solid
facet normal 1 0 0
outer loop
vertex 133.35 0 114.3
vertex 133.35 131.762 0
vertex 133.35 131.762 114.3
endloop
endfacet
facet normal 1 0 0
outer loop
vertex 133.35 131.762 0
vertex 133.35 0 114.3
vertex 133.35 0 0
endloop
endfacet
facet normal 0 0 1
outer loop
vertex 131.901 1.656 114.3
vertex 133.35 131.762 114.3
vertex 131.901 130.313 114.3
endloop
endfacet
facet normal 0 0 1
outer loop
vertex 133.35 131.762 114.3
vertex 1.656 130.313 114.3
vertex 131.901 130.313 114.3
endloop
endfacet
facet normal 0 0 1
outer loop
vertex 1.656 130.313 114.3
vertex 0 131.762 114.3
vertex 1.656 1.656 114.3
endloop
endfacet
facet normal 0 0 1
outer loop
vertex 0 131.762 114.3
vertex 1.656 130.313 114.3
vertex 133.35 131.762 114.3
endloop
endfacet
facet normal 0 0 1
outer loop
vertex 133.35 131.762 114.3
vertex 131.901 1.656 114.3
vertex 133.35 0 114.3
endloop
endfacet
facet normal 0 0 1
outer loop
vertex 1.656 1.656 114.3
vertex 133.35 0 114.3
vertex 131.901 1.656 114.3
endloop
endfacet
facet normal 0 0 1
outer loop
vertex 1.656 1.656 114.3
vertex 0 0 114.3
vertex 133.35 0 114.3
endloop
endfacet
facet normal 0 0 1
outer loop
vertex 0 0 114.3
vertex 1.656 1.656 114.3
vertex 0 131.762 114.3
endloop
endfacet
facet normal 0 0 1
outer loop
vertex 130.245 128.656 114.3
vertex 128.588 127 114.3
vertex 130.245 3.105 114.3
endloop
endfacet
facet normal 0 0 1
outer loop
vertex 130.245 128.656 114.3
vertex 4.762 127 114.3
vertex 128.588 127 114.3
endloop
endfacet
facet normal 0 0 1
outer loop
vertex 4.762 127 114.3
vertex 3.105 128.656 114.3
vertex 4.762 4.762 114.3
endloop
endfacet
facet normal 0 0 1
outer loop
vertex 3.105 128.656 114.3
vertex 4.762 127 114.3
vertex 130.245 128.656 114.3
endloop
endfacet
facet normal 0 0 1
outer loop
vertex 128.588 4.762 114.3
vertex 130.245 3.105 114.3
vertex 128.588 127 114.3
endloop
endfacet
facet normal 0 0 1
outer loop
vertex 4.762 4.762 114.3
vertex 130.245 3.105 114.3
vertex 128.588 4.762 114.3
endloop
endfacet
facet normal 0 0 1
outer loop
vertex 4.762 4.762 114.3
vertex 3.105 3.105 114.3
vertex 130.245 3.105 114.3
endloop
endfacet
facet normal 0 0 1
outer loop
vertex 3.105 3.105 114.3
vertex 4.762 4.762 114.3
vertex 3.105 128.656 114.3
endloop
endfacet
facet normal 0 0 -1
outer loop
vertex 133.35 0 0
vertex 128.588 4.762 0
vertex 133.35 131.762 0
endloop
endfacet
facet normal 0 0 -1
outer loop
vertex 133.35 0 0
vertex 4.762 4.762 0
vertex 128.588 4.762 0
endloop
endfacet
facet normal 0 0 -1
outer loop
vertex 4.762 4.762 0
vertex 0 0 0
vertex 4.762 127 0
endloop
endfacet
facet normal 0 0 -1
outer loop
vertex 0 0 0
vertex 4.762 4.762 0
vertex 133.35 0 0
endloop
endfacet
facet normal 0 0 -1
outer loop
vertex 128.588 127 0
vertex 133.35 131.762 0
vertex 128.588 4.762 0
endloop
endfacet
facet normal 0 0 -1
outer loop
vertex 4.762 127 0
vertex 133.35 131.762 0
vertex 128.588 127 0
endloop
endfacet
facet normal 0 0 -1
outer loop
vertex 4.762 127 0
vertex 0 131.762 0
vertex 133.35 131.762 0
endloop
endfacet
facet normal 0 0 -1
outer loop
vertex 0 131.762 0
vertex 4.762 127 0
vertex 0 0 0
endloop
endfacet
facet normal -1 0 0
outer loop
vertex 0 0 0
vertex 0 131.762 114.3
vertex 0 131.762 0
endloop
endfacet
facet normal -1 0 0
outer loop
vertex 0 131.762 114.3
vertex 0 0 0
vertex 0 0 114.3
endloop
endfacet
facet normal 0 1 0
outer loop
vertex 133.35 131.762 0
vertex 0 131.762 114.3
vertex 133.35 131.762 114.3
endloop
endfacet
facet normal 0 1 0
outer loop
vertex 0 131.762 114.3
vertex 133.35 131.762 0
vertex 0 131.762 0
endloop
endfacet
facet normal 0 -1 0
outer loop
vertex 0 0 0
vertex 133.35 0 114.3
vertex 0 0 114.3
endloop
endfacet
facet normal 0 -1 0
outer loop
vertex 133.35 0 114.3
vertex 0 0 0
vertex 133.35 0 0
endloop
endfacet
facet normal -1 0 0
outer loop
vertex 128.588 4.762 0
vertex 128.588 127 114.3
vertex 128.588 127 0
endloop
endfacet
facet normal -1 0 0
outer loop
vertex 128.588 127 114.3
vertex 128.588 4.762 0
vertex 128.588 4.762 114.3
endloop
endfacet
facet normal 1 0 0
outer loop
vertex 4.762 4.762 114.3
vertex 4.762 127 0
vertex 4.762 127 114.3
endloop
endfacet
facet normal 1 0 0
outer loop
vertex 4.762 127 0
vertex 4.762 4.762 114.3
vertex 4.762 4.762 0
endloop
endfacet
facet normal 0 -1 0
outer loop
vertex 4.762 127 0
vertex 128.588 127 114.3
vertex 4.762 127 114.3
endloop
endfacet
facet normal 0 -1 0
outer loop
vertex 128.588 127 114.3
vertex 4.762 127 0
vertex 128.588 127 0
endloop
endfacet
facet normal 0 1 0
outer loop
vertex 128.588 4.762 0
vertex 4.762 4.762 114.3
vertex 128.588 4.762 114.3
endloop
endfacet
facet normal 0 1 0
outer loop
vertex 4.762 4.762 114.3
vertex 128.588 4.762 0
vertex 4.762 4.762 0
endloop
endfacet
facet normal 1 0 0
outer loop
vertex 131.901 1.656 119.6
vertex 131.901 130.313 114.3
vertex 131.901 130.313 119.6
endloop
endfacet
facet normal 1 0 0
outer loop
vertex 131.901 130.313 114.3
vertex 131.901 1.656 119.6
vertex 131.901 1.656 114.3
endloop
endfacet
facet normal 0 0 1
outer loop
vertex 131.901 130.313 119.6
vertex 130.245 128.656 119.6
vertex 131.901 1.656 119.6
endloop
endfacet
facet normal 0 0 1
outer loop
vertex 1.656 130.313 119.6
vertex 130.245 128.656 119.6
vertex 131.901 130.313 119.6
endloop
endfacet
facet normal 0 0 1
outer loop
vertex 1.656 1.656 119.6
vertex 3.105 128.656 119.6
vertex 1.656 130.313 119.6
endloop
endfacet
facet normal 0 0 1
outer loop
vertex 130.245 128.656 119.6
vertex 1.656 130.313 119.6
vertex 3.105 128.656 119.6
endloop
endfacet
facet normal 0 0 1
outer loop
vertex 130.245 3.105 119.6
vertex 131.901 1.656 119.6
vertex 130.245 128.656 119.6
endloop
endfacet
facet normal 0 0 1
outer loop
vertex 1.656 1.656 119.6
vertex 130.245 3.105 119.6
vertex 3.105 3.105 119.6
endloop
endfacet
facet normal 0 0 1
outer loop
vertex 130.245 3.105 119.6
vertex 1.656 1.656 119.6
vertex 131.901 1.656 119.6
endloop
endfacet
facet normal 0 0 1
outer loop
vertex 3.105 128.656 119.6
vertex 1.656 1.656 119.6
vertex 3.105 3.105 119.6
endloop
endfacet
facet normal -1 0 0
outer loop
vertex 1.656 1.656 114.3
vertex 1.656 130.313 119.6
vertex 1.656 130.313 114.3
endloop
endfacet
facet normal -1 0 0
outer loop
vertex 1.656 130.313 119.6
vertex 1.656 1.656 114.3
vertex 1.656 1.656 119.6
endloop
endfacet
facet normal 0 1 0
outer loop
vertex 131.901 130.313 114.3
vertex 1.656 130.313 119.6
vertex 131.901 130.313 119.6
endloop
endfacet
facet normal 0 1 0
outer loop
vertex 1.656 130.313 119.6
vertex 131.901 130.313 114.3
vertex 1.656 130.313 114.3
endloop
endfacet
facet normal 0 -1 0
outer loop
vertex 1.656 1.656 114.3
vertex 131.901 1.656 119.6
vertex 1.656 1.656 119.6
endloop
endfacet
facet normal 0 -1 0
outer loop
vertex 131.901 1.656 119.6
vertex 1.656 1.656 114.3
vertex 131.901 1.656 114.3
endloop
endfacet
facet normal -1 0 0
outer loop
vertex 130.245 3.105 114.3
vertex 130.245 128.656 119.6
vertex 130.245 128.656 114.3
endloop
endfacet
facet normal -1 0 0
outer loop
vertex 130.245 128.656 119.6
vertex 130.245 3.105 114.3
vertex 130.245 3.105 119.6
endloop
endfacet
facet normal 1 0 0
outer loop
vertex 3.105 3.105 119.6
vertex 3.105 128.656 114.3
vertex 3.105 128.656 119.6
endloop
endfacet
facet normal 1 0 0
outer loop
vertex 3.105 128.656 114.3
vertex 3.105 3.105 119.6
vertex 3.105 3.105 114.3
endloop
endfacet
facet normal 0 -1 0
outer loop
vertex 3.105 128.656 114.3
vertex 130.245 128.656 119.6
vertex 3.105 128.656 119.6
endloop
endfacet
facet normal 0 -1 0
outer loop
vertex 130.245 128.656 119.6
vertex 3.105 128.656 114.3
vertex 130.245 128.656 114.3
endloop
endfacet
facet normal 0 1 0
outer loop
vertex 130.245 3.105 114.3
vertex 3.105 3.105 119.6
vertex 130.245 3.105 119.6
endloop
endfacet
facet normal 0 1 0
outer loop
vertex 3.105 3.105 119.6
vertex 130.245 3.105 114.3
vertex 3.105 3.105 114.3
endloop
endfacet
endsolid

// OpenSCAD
/* [Model Resolution (All dimensions are in Millimeters)] */
$fn = 256;

/* [Box Container Properties] */
Length = 133.35;
Width = 131.762;
Fit = .889; //.889(.035") is a good fit for most 
Height = 114.3;  //241.3
Wall_Thickness = 4.762;
Floor_Thickness = 6.3;

/* [Tab Properties] */
Tab_Width = 2.338;
Groove_Depth = 6.3;

/* [Hidden] */
tab_width = Tab_Width - Fit;

Outside_Box();
Groove_Box();

module Outside_Box(){
  difference()
{   
    // Outside Dimensions
    cube([ 
        Length, 
        Width, 
        Height ],
         center = false);
    // Inside Dimensions
    translate([ 
        Wall_Thickness, 
        Wall_Thickness, 
       -1
    ])
        cube([ 
          Length-Wall_Thickness*2, 
          Width-Wall_Thickness*2, 
          Height+3
    ], 
          center = false);
    
};
}

module Groove_Box(){
 
// Groove Square
// Outside Dimensions
color("red"){
translate([
    Wall_Thickness/2-tab_width/2,
    Wall_Thickness/2-tab_width/2,
    Height-1,
    ]) {   
difference(){
cube([ 
        Length-(tab_width/2)-(Wall_Thickness/2), 
        Width-(tab_width/2)-(Wall_Thickness/2), 
        Groove_Depth 
    ],
         center = false
);
//Inside Dimensions
translate([
tab_width,
tab_width,
-1,
])
cube([
 Length-Wall_Thickness-tab_width, 
 Width-Wall_Thickness-tab_width, 
Groove_Depth+3
],
center = false
); 
    
};
 };  
}; 
}
